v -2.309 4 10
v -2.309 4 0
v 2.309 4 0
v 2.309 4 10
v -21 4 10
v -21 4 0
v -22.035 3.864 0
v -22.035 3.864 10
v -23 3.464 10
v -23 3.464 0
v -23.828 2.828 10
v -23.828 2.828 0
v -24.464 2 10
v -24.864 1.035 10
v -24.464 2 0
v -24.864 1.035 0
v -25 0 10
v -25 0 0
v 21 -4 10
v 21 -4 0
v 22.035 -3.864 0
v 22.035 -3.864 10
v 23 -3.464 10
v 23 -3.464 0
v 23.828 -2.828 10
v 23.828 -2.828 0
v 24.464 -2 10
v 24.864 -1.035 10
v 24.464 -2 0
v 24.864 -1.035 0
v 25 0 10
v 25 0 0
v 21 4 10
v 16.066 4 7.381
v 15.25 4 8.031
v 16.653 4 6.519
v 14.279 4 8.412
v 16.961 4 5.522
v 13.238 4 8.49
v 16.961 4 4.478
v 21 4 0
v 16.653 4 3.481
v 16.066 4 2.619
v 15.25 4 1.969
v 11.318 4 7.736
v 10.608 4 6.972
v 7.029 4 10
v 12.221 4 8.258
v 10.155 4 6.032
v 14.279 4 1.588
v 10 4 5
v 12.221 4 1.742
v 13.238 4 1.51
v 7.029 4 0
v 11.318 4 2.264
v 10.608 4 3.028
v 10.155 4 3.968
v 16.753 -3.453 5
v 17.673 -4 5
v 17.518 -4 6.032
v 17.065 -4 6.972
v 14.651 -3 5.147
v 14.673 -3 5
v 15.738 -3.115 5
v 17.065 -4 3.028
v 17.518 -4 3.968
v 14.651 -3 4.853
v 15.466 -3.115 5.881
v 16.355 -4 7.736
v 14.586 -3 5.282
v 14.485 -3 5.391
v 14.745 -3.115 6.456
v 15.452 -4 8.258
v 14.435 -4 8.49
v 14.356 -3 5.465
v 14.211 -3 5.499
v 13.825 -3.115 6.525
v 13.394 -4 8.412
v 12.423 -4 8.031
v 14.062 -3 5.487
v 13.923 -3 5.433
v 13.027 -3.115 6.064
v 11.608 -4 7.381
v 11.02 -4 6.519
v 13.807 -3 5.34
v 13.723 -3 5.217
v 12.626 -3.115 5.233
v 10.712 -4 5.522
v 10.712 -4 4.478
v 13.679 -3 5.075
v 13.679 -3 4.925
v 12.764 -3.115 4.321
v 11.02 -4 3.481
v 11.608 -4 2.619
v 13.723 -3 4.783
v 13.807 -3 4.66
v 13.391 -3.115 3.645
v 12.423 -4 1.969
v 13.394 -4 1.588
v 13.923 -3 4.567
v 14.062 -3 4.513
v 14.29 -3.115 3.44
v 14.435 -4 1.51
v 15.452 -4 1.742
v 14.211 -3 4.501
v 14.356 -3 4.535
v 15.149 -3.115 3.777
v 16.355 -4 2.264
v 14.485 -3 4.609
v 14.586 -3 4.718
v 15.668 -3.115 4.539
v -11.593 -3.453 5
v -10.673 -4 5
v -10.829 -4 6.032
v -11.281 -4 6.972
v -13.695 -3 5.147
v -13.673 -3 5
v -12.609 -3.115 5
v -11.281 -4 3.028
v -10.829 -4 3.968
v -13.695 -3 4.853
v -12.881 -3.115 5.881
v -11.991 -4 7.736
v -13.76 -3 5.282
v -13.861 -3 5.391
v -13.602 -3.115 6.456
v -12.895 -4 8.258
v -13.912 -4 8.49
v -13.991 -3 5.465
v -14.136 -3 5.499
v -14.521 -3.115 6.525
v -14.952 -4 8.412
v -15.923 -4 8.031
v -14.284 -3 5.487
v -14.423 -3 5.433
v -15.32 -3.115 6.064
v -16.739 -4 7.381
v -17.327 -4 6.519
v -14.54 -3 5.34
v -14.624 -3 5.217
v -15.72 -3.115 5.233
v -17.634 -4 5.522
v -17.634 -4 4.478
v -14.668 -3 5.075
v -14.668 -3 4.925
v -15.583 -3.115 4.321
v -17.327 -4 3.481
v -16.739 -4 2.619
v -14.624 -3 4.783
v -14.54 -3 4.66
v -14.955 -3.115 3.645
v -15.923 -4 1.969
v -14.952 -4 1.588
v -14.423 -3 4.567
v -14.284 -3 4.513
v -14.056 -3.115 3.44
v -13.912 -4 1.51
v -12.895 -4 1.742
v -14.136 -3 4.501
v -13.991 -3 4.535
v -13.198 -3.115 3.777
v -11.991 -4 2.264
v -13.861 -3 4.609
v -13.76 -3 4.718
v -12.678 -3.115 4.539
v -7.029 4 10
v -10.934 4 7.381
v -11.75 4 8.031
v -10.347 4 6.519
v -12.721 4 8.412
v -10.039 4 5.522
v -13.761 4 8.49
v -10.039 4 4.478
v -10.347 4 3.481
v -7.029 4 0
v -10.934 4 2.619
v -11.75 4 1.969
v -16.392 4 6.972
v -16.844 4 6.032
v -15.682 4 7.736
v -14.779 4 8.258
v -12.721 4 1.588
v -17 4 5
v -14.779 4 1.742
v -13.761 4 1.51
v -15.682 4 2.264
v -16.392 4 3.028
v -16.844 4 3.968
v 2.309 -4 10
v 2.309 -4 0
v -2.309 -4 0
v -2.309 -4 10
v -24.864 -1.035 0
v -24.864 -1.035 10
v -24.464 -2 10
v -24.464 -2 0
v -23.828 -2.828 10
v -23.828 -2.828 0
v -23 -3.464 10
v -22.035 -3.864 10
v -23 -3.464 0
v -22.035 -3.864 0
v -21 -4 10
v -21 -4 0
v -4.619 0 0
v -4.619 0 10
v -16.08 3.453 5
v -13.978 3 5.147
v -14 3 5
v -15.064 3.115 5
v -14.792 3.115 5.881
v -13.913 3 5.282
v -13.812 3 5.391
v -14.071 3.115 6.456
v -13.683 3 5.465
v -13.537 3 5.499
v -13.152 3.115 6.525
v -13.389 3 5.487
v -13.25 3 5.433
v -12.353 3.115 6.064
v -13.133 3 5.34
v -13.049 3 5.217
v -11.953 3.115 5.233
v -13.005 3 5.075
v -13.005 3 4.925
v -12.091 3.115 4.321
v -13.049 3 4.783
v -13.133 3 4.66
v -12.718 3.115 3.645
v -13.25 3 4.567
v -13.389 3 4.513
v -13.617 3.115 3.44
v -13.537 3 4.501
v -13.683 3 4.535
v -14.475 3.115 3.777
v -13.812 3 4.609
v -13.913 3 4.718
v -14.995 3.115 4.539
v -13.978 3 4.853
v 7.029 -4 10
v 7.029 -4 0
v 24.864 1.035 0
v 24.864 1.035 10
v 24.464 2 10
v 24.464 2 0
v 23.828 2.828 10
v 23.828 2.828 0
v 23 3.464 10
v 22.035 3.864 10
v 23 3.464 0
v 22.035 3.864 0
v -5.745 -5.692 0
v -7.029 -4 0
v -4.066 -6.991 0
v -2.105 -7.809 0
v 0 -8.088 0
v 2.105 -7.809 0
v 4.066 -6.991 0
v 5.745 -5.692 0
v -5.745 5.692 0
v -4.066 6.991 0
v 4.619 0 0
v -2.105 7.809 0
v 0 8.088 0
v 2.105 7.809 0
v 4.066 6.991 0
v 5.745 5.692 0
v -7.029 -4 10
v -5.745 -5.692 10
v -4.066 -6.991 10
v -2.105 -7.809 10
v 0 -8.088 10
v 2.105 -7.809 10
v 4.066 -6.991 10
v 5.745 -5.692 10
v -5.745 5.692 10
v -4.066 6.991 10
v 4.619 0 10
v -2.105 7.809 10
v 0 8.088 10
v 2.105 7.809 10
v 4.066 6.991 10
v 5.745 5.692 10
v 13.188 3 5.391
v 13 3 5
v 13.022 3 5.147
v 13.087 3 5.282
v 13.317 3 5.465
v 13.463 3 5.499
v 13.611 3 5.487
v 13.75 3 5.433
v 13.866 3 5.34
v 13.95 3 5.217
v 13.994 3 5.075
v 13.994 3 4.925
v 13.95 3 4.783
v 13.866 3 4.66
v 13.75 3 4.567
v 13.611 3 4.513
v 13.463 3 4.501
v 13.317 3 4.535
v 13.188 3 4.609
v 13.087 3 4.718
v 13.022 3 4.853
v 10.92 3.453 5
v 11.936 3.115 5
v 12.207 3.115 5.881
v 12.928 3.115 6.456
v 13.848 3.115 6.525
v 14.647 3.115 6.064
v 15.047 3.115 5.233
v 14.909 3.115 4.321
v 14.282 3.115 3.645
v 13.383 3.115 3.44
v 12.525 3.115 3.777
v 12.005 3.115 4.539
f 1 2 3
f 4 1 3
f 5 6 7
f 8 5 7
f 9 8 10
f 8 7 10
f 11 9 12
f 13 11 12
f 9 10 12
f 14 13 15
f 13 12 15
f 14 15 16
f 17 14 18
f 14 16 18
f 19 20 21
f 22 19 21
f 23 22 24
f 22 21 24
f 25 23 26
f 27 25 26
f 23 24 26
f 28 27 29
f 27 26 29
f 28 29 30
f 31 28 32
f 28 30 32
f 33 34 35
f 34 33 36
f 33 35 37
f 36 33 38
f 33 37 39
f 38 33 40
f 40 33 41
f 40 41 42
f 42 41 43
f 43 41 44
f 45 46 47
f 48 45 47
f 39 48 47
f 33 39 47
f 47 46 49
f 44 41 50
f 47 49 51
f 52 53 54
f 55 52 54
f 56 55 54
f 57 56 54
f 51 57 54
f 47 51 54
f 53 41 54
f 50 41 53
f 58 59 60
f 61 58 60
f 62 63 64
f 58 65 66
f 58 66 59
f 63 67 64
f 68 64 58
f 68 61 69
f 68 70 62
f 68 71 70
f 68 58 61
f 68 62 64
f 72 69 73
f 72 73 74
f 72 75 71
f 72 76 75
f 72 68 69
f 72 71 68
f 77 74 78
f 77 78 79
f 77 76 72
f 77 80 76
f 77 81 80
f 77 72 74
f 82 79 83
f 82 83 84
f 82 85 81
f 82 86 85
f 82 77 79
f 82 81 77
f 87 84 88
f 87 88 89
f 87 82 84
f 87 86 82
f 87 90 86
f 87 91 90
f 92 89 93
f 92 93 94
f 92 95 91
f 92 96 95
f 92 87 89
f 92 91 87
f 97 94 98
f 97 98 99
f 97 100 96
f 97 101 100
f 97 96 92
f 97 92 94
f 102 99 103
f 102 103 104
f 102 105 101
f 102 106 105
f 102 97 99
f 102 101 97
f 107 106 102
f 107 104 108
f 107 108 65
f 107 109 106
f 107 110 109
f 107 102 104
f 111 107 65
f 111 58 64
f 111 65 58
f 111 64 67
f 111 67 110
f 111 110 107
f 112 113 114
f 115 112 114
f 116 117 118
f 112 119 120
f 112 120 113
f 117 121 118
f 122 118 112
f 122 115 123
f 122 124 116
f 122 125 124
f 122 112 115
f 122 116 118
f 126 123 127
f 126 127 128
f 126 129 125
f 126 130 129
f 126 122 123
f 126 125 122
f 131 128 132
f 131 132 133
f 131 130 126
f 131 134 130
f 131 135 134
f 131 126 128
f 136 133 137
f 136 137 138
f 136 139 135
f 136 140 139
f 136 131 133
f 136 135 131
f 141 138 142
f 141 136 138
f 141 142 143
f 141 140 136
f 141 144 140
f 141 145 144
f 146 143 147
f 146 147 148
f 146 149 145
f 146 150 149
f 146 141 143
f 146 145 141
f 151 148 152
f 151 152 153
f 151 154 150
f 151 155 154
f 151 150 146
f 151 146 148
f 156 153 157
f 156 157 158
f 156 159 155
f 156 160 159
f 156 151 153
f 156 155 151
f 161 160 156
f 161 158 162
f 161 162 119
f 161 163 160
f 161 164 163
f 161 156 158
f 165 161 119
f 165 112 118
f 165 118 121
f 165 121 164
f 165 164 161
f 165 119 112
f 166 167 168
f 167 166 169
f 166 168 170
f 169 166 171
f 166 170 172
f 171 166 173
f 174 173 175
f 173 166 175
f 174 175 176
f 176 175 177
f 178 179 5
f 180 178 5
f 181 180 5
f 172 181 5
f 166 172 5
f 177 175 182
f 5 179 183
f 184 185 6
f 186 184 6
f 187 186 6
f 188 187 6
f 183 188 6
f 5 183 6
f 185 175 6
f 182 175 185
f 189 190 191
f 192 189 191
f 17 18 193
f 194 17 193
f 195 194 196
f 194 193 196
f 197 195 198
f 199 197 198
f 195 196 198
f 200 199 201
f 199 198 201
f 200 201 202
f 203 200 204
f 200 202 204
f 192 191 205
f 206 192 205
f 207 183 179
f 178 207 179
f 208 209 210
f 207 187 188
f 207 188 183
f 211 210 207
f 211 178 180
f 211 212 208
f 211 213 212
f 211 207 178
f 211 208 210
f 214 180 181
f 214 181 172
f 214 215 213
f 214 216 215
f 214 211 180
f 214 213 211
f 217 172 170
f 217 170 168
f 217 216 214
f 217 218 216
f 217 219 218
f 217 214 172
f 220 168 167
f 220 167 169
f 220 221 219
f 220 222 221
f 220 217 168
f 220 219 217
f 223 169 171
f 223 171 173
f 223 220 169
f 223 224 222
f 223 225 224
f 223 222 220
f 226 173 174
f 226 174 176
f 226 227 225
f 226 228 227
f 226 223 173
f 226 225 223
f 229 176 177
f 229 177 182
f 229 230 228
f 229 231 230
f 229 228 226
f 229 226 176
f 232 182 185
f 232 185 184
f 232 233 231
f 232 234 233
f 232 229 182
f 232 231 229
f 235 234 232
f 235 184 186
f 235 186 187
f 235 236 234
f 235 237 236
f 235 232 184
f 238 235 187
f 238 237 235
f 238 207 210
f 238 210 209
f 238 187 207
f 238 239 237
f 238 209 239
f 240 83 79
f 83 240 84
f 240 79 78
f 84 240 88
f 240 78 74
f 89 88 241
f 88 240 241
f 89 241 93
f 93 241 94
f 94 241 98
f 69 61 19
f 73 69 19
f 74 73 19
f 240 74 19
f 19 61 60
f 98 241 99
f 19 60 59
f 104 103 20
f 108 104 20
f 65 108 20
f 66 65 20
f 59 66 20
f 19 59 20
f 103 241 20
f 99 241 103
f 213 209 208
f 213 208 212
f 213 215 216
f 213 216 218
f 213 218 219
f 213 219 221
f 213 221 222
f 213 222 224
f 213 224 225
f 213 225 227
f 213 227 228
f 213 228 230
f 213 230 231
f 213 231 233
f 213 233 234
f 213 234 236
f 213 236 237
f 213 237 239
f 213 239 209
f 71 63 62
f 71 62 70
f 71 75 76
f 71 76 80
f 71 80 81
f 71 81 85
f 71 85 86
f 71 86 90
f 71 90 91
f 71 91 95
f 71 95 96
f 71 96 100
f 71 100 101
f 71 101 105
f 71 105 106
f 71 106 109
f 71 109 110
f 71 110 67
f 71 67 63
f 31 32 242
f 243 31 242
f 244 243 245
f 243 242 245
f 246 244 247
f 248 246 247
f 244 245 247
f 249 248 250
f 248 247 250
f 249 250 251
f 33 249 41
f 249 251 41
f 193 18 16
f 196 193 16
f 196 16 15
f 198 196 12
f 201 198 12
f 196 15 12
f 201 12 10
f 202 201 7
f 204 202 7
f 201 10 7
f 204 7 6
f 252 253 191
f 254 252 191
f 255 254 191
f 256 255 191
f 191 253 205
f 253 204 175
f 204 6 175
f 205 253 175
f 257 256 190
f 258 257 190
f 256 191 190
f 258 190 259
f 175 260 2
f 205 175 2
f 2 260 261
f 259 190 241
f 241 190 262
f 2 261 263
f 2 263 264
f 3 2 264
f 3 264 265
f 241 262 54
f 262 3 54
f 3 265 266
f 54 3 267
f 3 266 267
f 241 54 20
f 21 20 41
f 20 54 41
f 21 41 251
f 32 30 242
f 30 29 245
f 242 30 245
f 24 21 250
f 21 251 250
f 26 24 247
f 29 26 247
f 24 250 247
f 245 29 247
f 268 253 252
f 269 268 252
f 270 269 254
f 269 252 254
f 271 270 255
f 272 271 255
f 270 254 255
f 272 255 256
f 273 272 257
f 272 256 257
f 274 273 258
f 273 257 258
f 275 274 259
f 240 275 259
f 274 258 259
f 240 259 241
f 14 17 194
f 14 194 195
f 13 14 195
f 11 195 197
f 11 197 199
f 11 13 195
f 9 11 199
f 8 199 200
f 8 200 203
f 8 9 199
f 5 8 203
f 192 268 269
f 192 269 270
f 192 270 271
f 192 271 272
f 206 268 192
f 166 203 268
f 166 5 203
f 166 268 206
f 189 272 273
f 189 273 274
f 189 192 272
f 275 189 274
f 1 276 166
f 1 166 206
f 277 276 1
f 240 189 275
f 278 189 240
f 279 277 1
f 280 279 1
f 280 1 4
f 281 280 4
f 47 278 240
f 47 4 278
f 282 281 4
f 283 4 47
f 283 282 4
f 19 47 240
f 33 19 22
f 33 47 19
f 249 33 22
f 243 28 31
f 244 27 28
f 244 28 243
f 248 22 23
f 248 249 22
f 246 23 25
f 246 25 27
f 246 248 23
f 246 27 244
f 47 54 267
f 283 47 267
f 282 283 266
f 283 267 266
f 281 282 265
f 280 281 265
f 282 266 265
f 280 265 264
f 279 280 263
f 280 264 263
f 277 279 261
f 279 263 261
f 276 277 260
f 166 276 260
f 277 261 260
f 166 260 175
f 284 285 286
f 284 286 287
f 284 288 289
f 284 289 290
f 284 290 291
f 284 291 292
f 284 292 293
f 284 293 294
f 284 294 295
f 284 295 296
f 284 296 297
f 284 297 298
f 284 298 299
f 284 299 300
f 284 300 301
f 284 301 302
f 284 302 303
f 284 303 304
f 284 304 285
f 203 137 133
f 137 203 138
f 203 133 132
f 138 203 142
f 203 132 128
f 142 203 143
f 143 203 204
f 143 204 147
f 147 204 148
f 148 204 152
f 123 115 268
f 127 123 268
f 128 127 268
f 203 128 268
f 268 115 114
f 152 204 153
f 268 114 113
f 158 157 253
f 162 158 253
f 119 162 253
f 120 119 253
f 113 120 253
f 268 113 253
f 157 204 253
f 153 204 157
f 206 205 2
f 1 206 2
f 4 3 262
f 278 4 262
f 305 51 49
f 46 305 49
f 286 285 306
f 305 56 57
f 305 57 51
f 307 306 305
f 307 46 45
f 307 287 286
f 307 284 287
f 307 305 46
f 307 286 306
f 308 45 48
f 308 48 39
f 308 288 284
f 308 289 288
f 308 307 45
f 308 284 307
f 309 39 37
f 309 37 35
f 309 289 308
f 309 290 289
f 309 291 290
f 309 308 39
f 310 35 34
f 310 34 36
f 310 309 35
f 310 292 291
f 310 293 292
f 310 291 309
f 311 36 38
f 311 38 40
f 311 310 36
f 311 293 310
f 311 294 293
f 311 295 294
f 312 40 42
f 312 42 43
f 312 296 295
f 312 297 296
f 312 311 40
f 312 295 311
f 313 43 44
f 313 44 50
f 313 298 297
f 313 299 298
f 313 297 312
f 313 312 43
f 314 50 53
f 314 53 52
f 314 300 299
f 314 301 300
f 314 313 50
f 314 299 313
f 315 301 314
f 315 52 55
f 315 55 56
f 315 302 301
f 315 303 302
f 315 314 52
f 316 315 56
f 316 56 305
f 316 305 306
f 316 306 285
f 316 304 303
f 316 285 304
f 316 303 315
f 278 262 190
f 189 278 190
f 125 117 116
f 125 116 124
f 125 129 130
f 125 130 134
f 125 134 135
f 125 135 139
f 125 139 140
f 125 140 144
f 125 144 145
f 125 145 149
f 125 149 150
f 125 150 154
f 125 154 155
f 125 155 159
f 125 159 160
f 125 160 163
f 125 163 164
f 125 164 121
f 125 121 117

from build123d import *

# Parameters (mm, degrees)
F1_DEPTH = 10
F2_R     = 3.5
F4_DEPTH = 1
F3_R     = 3.5
F6_DEPTH = 1


# Not quite as in the source:
# - a fillet or chamfer that OpenCascade refuses, or shapes differently, is made with other operations: its cross-section is extruded or revolved along the edge and cut away or added


with BuildPart() as f1:
    # F0 (on Top) → F1 (new body)
    with BuildSketch(Plane.XY):
        with BuildLine():
            Line((-7.0290866446, 4), (-2.3094010768, 4))
            Line((-2.3094010768, 4), (2.3094010768, 4))
            Line((2.3094010768, 4), (7.0290866446, 4))
            ThreePointArc((7.0290866446, 4), (0, 8.087524903), (-7.0290866446, 4))
        make_face()
        with BuildLine():
            Line((-4.6188021535, 0), (-2.3094010768, 4))
            Line((-2.3094010768, 4), (-7.0290866446, 4))
            ThreePointArc((-7.0290866446, 4), (-8.087524903, 0), (-7.0290866446, -4))
            Line((-7.0290866446, -4), (-2.3094010768, -4))
            Line((-2.3094010768, -4), (-4.6188021535, 0))
        make_face()
        with BuildLine():
            Line((7.0290866446, 4), (2.3094010768, 4))
            Line((2.3094010768, 4), (4.6188021535, 0))
            Line((4.6188021535, 0), (2.3094010768, -4))
            Line((2.3094010768, -4), (7.0290866446, -4))
            ThreePointArc((7.0290866446, -4), (7.8184388576, -2.068833702), (8.087524903, 0))
            ThreePointArc((8.087524903, 0), (7.8184388576, 2.068833702), (7.0290866446, 4))
        make_face()
        with BuildLine():
            ThreePointArc((-7.0290866446, -4), (-8.087524903, 0), (-7.0290866446, 4))
            Line((-7.0290866446, 4), (-21, 4))
            ThreePointArc((-21, 4), (-23.8284271247, 2.8284271247), (-25, 0))
            ThreePointArc((-25, 0), (-23.8284271247, -2.8284271247), (-21, -4))
            Line((-21, -4), (-7.0290866446, -4))
        make_face()
        with BuildLine():
            Line((21, 4), (7.0290866446, 4))
            ThreePointArc((7.0290866446, 4), (7.8184388576, 2.068833702), (8.087524903, 0))
            ThreePointArc((8.087524903, 0), (7.8184388576, -2.068833702), (7.0290866446, -4))
            Line((7.0290866446, -4), (21, -4))
            ThreePointArc((21, -4), (23.8284271247, -2.8284271247), (25, 0))
            ThreePointArc((25, 0), (23.8284271247, 2.8284271247), (21, 4))
        make_face()
        with BuildLine():
            Line((2.3094010768, -4), (-2.3094010768, -4))
            Line((-2.3094010768, -4), (-7.0290866446, -4))
            ThreePointArc((-7.0290866446, -4), (0, -8.087524903), (7.0290866446, -4))
            Line((7.0290866446, -4), (2.3094010768, -4))
        make_face()
    extrude(amount=F1_DEPTH)

    # F2 (on face) → F4 (cut)
    with BuildSketch(Plane.XZ.offset(4)):
        with Locations((-14.1732281117, 5)):
            Circle(F2_R)
        with Locations((14.1732281117, 5)):
            Circle(F2_R)
    extrude(amount=-F4_DEPTH, mode=Mode.SUBTRACT)

    # F5: fillet of radius 5 on 2 edges, made by hand

    # F5_s1 → F5_t2 (revolve)
    with BuildSketch(Plane.XY.offset(5)):
        with BuildLine():
            ThreePointArc((-10.6732281117, -4), (-12.0920892816, -3.2565835097), (-13.6732281117, -3))
            Line((-13.6732281117, -3), (-10.6732281117, -3))
            Line((-10.6732281117, -3), (-10.6732281117, -4))
        make_face()
    revolve(axis=Axis((-14.1732281117, -3, 5), (0, -1, 0)))

    # F5_s3 → F5_t4 (revolve)
    with BuildSketch(Plane.XY.offset(5)):
        with BuildLine():
            ThreePointArc((17.6732281117, -4), (16.2543669417, -3.2565835097), (14.6732281117, -3))
            Line((14.6732281117, -3), (17.6732281117, -3))
            Line((17.6732281117, -3), (17.6732281117, -4))
        make_face()
    revolve(axis=Axis((14.1732281117, -3, 5), (0, -1, 0)))

    # F3 (on face) → F6 (cut)
    with BuildSketch(Plane(origin=(0, 4, 0), x_dir=(-1, 0, 0), z_dir=(0, 1, 0))):
        with Locations((13.4998997673, 5.0000185147)):
            Circle(F3_R)
        with Locations((-13.4998997673, 5.0000185147)):
            Circle(F3_R)
    extrude(amount=-F6_DEPTH, mode=Mode.SUBTRACT)

    # F7: fillet of radius 5 on 2 edges, made by hand

    # F7_s1 → F7_t2 (revolve)
    with BuildSketch(Plane.XY.offset(5.0000185147)):
        with BuildLine():
            ThreePointArc((9.9998997673, 4), (11.4187609373, 3.2565835097), (12.9998997673, 3))
            Line((12.9998997673, 3), (9.9998997673, 3))
            Line((9.9998997673, 3), (9.9998997673, 4))
        make_face()
    revolve(axis=Axis((13.4998997673, 3, 5.0000185147), (0, 1, 0)))

    # F7_s3 → F7_t4 (revolve)
    with BuildSketch(Plane.XY.offset(5.0000185147)):
        with BuildLine():
            ThreePointArc((-16.9998997673, 4), (-15.5810385974, 3.2565835097), (-13.9998997673, 3))
            Line((-13.9998997673, 3), (-16.9998997673, 3))
            Line((-16.9998997673, 3), (-16.9998997673, 4))
        make_face()
    revolve(axis=Axis((-13.4998997673, 3, 5.0000185147), (0, 1, 0)))


solid = f1.part
